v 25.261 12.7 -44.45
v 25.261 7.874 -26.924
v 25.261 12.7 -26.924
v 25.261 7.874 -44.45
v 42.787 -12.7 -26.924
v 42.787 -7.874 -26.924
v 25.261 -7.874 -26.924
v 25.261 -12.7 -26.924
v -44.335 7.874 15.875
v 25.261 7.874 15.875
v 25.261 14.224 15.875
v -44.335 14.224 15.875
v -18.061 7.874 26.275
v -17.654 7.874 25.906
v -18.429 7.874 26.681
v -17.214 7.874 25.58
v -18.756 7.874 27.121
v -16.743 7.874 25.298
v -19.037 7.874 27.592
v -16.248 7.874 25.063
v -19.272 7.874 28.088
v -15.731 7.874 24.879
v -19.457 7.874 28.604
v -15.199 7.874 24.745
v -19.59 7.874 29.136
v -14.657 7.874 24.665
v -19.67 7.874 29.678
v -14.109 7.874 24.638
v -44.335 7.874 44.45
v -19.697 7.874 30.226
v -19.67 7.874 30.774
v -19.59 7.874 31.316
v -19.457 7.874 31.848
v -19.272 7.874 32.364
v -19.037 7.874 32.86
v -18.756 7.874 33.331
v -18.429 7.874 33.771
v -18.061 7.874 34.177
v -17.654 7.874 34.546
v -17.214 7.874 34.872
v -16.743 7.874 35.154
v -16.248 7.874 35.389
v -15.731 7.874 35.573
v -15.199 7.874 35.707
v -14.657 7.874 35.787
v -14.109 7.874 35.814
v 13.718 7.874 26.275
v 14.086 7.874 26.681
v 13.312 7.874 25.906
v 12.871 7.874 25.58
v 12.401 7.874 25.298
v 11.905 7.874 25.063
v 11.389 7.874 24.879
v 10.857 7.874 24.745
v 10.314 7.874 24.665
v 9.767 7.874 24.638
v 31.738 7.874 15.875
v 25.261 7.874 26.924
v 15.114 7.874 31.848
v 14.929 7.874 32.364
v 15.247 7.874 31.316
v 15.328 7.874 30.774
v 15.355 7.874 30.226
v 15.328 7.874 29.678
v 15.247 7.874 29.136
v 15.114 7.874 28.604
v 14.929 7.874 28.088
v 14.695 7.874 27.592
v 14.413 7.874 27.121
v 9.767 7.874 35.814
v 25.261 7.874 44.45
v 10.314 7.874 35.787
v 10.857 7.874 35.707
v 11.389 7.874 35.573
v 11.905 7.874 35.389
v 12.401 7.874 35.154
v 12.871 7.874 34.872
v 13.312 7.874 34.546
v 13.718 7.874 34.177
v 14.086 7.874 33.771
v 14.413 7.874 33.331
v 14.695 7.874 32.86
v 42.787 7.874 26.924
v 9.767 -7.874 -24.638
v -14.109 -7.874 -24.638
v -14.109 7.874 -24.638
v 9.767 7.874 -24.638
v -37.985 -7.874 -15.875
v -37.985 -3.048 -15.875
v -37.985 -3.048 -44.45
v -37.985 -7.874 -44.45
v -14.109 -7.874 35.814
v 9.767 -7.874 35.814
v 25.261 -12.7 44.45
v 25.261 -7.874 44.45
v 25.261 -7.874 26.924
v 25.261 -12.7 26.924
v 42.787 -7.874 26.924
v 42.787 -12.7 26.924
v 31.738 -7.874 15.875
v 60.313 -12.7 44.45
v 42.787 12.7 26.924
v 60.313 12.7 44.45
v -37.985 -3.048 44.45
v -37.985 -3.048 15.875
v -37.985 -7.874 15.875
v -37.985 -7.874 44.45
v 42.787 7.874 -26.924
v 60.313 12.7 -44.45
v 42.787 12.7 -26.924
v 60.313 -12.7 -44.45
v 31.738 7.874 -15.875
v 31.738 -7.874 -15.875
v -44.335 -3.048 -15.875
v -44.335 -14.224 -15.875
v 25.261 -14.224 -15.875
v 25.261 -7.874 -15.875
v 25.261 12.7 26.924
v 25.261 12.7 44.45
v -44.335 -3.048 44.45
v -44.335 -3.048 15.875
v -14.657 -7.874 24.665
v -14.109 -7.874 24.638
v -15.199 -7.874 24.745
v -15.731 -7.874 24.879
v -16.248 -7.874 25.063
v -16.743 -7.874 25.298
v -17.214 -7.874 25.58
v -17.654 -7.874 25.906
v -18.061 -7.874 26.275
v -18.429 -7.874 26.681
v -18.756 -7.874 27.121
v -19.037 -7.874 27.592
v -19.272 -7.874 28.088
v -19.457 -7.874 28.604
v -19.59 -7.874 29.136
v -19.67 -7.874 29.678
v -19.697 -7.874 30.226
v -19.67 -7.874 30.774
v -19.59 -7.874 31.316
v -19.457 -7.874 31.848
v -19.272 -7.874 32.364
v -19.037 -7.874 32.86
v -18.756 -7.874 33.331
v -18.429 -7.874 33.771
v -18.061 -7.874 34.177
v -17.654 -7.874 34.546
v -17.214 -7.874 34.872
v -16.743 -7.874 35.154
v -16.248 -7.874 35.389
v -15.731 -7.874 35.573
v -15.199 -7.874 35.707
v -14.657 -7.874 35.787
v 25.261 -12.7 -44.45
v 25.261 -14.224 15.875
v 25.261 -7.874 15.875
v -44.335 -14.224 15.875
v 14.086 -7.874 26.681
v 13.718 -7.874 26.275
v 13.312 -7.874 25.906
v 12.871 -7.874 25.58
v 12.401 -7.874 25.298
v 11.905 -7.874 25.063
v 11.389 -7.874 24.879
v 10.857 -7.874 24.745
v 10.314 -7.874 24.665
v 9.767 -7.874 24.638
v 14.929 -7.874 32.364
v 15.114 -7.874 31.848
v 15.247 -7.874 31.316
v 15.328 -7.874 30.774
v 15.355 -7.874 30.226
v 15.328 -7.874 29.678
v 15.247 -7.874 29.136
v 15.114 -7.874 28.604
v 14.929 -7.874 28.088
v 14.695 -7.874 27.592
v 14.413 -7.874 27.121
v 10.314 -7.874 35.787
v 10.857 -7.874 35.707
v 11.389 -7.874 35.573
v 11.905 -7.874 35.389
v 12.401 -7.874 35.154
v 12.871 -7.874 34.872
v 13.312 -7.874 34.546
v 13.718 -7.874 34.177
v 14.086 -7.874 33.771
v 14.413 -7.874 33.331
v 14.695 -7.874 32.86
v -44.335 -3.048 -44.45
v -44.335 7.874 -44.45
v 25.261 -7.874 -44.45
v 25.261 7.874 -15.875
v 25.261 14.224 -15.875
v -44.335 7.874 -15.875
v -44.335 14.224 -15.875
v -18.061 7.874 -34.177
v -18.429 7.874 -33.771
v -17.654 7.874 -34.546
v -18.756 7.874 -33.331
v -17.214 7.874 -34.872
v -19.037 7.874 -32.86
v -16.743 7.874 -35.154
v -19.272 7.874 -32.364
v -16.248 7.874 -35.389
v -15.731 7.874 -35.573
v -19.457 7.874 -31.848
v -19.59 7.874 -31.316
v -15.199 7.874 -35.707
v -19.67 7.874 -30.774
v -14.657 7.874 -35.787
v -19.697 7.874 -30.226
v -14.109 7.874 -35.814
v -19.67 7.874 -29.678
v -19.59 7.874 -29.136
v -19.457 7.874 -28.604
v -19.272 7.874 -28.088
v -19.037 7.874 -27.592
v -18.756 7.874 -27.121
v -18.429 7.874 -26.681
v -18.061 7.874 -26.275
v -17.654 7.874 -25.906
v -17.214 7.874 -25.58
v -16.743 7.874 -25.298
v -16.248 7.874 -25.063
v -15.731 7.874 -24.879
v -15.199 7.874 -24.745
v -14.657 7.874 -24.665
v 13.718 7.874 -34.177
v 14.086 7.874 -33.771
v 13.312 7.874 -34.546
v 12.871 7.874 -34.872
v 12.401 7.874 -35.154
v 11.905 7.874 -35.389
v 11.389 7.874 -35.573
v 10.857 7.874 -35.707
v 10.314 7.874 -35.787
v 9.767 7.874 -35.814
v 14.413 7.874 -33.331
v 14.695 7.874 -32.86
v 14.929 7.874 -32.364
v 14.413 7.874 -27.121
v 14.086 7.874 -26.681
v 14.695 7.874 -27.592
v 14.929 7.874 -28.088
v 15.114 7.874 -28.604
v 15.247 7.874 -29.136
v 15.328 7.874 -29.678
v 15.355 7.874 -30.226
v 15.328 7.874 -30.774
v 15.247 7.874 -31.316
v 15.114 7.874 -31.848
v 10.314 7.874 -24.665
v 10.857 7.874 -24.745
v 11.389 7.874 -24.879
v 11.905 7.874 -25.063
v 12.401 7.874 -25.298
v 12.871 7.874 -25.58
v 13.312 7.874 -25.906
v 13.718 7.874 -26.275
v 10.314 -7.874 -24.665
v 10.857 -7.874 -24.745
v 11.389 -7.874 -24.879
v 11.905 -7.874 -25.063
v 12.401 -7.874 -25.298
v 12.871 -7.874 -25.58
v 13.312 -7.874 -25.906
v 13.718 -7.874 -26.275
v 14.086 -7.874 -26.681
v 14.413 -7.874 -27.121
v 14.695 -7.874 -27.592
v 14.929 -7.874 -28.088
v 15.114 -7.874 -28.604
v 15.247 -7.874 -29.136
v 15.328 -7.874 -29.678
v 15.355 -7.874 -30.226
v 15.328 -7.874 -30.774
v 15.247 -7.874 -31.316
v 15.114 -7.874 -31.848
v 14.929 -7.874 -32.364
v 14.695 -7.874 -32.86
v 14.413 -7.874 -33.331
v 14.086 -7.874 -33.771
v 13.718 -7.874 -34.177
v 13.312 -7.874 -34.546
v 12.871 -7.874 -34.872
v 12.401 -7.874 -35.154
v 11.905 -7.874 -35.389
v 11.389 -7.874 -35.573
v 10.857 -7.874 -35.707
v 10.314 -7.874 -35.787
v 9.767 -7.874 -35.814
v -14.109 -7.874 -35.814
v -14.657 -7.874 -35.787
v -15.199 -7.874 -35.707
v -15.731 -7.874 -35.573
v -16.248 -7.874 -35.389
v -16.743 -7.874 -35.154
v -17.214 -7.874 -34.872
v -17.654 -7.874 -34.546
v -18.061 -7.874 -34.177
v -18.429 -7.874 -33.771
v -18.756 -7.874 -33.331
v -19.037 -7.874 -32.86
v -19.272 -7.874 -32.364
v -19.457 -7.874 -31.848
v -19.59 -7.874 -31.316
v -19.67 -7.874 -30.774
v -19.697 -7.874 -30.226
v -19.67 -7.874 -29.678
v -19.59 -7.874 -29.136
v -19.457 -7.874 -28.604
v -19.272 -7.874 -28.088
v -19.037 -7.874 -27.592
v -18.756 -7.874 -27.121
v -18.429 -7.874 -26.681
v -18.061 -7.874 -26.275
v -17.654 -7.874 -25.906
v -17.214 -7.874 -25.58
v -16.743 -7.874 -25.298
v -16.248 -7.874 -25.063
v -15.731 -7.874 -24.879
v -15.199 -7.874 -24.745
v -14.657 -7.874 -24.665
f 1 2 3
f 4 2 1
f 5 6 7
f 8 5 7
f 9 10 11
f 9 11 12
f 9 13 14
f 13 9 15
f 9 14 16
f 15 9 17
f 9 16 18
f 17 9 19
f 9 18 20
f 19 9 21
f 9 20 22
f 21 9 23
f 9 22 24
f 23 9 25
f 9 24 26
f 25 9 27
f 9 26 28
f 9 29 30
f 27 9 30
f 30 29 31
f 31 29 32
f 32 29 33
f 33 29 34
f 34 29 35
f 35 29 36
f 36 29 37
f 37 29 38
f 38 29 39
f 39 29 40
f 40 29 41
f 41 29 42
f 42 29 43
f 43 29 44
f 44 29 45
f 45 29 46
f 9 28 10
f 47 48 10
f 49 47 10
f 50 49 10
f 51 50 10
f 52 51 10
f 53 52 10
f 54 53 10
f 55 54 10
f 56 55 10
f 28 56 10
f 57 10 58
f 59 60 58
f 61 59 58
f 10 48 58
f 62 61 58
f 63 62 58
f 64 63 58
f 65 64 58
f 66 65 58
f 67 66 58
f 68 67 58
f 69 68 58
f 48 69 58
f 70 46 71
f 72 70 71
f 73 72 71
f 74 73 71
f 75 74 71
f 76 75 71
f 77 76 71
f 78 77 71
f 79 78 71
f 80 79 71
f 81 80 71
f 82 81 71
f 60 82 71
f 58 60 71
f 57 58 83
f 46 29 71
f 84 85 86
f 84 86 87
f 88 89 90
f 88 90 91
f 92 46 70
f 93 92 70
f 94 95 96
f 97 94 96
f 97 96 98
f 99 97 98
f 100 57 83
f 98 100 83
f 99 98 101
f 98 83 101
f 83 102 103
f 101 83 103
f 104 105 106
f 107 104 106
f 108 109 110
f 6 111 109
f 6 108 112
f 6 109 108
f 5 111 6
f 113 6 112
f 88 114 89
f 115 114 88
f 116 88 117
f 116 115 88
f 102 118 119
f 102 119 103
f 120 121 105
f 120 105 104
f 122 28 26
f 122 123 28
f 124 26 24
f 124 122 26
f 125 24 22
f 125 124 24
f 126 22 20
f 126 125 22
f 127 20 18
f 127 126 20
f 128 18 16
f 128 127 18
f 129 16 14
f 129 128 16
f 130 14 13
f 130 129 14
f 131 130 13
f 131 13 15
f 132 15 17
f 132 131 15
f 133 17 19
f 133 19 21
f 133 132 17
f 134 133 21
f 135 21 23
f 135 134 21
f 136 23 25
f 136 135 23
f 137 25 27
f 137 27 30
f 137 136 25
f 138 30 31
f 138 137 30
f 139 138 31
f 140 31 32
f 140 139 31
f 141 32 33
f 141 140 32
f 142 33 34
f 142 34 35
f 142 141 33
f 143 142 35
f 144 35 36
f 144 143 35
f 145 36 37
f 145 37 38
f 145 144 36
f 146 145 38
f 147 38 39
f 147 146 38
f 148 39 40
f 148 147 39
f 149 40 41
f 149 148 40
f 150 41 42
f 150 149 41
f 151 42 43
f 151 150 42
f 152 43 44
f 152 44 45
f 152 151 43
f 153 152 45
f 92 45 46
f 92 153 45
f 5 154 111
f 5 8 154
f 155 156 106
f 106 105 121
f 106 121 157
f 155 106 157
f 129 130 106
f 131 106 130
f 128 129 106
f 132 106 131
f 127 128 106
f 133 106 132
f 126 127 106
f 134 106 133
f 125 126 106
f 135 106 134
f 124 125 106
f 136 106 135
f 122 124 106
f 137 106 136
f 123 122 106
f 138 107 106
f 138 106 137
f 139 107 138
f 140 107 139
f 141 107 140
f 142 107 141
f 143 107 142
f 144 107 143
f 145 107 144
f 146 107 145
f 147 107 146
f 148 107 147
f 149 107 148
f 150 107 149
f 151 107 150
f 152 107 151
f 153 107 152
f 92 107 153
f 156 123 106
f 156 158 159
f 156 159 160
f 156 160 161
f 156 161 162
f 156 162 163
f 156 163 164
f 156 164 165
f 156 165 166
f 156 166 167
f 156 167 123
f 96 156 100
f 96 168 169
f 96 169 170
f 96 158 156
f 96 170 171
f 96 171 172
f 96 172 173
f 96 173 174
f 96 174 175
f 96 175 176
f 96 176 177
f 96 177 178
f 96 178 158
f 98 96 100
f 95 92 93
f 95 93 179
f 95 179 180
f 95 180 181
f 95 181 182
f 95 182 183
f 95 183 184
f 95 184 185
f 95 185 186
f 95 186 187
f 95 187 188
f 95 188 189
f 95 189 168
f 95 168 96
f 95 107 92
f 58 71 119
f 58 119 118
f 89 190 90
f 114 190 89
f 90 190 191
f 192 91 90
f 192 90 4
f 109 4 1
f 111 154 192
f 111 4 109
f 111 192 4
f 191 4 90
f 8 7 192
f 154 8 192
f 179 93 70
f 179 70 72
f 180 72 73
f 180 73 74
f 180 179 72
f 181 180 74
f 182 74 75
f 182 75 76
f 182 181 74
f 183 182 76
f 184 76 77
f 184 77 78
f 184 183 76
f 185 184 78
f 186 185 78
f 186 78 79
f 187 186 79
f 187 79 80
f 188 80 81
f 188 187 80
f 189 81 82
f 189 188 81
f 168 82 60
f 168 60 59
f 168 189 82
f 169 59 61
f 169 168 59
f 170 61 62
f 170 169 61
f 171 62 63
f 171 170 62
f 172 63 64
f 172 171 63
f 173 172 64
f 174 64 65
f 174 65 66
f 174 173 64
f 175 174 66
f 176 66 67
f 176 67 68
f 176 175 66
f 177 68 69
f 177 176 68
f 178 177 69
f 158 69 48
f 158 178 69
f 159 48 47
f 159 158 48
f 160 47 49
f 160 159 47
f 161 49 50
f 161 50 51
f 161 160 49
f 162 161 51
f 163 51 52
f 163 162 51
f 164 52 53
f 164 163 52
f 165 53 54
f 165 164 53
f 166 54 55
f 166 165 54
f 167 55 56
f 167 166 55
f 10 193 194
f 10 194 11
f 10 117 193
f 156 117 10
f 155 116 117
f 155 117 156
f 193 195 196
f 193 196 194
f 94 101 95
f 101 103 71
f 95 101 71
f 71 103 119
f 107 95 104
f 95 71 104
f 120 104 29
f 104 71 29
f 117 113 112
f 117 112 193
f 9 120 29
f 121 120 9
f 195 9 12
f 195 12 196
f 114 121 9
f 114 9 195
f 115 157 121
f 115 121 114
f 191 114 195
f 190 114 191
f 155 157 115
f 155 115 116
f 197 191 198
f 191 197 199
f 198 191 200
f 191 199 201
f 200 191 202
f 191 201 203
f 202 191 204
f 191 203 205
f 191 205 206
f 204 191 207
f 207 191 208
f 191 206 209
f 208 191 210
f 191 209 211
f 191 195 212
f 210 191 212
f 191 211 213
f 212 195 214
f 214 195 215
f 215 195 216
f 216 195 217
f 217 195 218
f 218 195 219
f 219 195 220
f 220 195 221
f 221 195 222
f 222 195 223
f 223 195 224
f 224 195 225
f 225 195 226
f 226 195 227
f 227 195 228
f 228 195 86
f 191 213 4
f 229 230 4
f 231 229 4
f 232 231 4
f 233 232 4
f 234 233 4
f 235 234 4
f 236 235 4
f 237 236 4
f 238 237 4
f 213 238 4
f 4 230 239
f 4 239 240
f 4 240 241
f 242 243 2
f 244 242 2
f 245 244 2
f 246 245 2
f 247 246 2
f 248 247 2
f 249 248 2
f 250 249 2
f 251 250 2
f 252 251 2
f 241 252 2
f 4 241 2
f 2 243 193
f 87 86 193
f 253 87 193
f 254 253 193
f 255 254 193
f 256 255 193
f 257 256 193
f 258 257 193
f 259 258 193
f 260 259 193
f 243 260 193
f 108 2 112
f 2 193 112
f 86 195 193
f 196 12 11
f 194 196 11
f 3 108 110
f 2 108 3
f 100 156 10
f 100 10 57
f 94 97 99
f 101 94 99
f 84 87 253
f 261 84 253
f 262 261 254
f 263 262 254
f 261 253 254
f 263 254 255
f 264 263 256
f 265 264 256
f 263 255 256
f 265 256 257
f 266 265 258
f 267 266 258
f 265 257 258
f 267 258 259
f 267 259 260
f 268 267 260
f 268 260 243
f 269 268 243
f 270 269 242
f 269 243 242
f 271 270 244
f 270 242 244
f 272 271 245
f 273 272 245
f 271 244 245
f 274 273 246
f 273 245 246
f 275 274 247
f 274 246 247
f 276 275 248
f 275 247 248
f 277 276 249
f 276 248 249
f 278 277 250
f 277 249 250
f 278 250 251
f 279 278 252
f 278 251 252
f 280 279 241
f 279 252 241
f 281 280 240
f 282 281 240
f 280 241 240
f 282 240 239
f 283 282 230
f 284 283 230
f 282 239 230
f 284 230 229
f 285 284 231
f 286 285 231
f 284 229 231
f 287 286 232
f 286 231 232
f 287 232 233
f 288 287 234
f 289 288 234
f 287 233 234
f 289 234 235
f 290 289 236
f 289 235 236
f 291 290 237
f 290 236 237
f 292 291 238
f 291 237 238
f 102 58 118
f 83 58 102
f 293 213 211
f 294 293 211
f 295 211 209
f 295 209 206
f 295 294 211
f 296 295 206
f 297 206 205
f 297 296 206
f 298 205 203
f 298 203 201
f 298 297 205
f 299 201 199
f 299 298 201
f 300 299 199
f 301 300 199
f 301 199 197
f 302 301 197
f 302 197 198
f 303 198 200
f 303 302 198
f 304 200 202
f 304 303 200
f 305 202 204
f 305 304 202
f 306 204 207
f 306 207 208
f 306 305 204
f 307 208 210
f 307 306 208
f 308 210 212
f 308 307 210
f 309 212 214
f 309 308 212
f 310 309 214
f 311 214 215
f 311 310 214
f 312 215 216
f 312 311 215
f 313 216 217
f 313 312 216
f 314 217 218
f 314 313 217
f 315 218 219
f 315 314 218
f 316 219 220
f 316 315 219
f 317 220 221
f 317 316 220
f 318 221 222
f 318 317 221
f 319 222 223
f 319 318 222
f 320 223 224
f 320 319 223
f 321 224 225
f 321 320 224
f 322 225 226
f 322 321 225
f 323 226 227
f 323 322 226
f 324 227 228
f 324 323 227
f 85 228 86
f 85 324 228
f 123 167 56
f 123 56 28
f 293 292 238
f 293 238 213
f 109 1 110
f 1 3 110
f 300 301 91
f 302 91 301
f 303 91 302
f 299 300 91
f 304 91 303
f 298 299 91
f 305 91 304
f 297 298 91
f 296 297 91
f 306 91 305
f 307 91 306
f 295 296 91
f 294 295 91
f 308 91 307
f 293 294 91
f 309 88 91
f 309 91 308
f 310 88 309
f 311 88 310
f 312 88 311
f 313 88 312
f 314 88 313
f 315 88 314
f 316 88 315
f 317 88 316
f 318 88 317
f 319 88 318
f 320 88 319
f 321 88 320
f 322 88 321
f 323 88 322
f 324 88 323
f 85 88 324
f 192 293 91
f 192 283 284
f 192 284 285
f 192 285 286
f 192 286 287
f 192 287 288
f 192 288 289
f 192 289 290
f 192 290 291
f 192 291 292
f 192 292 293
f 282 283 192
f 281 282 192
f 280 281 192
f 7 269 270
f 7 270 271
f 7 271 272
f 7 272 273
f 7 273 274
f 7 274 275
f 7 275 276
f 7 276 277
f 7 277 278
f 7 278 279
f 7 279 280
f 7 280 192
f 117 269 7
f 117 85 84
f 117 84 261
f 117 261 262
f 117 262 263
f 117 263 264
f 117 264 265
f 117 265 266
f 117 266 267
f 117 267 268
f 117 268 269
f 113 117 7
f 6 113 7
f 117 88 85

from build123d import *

# Parameters (mm, degrees)
F1_DEPTH = 14.224
F2_DEPTH = 7.874
F3_DEPTH = 7.874
F5_DEPTH = 4.826
F6_DEPTH = 25.4
F7_W     = 4.826
F7_H     = 28.575
F8_DEPTH = 6.35


with BuildPart() as f1:
    # F0 (on Front) → F1 (new body, symmetric)
    with BuildSketch(Plane.XZ):
        Polygon((-44.3352609873, 15.875), (-44.3352609873, 0), (-44.3352609873, -15.875), (25.2607390127, -15.875), (25.2607390127, 0), (25.2607390127, 15.875), align=None)
    extrude(amount=F1_DEPTH, both=True)

    # F0 (on Front) → F2 (join, symmetric)
    with BuildSketch(Plane.XZ):
        Polygon((25.2607390127, -15.875), (-44.3352609873, -15.875), (-44.3352609873, -44.45), (60.3127390127, -44.45), (31.7377390127, -15.875), align=None)
        with BuildLine():
            ThreePointArc((9.7667390127, -24.638), (13.718051706, -26.2746873067), (15.3547390127, -30.226))
            ThreePointArc((15.3547390127, -30.226), (13.7180517062, -34.177312693), (9.7667390134, -35.814))
            Line((9.7667390134, -35.814), (-14.1092609873, -35.814))
            ThreePointArc((-14.1092609873, -35.814), (-18.0605736806, -34.1773126933), (-19.6972609873, -30.226))
            ThreePointArc((-19.6972609873, -30.226), (-18.0605736745, -26.2746873007), (-14.1092609702, -24.638))
            Line((-14.1092609702, -24.638), (9.7667390127, -24.638))
        make_face(mode=Mode.SUBTRACT)
    extrude(amount=F2_DEPTH, both=True)

    # F0 (on Front) → F3 (join, symmetric)
    with BuildSketch(Plane.XZ):
        Polygon((-44.3352609873, 44.45), (-44.3352609873, 15.875), (25.2607390127, 15.875), (31.7377390127, 15.875), (60.3127390127, 44.45), align=None)
        with BuildLine():
            ThreePointArc((-19.6972609873, 30.226), (-18.0605736806, 34.1773126933), (-14.1092609873, 35.814))
            Line((-14.1092609873, 35.814), (9.7667390127, 35.814))
            ThreePointArc((9.7667390127, 35.814), (13.718051706, 34.1773126933), (15.3547390127, 30.226))
            ThreePointArc((15.3547390127, 30.226), (13.718051706, 26.2746873067), (9.7667390127, 24.638))
            Line((9.7667390127, 24.638), (-14.1092610119, 24.638))
            ThreePointArc((-14.1092610119, 24.638), (-18.0605736893, 26.2746873154), (-19.6972609873, 30.226))
        make_face(mode=Mode.SUBTRACT)
    extrude(amount=F3_DEPTH, both=True)

    # F4 (on face) → F5 (join)
    with BuildSketch(Plane.XZ.offset(7.874)):
        Polygon((60.3127390127, 44.45), (25.2607390127, 44.45), (25.2607390127, 26.924), (42.7867390127, 26.924), align=None)
        Polygon((25.2607390127, -44.45), (60.3127390127, -44.45), (42.7867390127, -26.924), (25.2607390127, -26.924), align=None)
    extrude(amount=F5_DEPTH)

    # F6 (add): faces of the model
    f6_faces = [f1.faces().sort_by_distance(p)[0] for p in [
        (38.8920723461, -12.7, 36.6606666667),
        (38.8920723461, -12.7, -36.6606666667),
    ]]
    extrude(f6_faces, amount=-F6_DEPTH)

    # F7 (on face) → F8 (cut)
    with BuildSketch(Plane(origin=(-44.3352609873, 0, 0), x_dir=(0, -1, 0), z_dir=(-1, 0, 0))):
        with Locations((5.461, 30.1625)):
            Rectangle(F7_W, F7_H)
        with Locations((5.461, -30.1625)):
            Rectangle(F7_W, F7_H)
    extrude(amount=-F8_DEPTH, mode=Mode.SUBTRACT)


solid = f1.part
